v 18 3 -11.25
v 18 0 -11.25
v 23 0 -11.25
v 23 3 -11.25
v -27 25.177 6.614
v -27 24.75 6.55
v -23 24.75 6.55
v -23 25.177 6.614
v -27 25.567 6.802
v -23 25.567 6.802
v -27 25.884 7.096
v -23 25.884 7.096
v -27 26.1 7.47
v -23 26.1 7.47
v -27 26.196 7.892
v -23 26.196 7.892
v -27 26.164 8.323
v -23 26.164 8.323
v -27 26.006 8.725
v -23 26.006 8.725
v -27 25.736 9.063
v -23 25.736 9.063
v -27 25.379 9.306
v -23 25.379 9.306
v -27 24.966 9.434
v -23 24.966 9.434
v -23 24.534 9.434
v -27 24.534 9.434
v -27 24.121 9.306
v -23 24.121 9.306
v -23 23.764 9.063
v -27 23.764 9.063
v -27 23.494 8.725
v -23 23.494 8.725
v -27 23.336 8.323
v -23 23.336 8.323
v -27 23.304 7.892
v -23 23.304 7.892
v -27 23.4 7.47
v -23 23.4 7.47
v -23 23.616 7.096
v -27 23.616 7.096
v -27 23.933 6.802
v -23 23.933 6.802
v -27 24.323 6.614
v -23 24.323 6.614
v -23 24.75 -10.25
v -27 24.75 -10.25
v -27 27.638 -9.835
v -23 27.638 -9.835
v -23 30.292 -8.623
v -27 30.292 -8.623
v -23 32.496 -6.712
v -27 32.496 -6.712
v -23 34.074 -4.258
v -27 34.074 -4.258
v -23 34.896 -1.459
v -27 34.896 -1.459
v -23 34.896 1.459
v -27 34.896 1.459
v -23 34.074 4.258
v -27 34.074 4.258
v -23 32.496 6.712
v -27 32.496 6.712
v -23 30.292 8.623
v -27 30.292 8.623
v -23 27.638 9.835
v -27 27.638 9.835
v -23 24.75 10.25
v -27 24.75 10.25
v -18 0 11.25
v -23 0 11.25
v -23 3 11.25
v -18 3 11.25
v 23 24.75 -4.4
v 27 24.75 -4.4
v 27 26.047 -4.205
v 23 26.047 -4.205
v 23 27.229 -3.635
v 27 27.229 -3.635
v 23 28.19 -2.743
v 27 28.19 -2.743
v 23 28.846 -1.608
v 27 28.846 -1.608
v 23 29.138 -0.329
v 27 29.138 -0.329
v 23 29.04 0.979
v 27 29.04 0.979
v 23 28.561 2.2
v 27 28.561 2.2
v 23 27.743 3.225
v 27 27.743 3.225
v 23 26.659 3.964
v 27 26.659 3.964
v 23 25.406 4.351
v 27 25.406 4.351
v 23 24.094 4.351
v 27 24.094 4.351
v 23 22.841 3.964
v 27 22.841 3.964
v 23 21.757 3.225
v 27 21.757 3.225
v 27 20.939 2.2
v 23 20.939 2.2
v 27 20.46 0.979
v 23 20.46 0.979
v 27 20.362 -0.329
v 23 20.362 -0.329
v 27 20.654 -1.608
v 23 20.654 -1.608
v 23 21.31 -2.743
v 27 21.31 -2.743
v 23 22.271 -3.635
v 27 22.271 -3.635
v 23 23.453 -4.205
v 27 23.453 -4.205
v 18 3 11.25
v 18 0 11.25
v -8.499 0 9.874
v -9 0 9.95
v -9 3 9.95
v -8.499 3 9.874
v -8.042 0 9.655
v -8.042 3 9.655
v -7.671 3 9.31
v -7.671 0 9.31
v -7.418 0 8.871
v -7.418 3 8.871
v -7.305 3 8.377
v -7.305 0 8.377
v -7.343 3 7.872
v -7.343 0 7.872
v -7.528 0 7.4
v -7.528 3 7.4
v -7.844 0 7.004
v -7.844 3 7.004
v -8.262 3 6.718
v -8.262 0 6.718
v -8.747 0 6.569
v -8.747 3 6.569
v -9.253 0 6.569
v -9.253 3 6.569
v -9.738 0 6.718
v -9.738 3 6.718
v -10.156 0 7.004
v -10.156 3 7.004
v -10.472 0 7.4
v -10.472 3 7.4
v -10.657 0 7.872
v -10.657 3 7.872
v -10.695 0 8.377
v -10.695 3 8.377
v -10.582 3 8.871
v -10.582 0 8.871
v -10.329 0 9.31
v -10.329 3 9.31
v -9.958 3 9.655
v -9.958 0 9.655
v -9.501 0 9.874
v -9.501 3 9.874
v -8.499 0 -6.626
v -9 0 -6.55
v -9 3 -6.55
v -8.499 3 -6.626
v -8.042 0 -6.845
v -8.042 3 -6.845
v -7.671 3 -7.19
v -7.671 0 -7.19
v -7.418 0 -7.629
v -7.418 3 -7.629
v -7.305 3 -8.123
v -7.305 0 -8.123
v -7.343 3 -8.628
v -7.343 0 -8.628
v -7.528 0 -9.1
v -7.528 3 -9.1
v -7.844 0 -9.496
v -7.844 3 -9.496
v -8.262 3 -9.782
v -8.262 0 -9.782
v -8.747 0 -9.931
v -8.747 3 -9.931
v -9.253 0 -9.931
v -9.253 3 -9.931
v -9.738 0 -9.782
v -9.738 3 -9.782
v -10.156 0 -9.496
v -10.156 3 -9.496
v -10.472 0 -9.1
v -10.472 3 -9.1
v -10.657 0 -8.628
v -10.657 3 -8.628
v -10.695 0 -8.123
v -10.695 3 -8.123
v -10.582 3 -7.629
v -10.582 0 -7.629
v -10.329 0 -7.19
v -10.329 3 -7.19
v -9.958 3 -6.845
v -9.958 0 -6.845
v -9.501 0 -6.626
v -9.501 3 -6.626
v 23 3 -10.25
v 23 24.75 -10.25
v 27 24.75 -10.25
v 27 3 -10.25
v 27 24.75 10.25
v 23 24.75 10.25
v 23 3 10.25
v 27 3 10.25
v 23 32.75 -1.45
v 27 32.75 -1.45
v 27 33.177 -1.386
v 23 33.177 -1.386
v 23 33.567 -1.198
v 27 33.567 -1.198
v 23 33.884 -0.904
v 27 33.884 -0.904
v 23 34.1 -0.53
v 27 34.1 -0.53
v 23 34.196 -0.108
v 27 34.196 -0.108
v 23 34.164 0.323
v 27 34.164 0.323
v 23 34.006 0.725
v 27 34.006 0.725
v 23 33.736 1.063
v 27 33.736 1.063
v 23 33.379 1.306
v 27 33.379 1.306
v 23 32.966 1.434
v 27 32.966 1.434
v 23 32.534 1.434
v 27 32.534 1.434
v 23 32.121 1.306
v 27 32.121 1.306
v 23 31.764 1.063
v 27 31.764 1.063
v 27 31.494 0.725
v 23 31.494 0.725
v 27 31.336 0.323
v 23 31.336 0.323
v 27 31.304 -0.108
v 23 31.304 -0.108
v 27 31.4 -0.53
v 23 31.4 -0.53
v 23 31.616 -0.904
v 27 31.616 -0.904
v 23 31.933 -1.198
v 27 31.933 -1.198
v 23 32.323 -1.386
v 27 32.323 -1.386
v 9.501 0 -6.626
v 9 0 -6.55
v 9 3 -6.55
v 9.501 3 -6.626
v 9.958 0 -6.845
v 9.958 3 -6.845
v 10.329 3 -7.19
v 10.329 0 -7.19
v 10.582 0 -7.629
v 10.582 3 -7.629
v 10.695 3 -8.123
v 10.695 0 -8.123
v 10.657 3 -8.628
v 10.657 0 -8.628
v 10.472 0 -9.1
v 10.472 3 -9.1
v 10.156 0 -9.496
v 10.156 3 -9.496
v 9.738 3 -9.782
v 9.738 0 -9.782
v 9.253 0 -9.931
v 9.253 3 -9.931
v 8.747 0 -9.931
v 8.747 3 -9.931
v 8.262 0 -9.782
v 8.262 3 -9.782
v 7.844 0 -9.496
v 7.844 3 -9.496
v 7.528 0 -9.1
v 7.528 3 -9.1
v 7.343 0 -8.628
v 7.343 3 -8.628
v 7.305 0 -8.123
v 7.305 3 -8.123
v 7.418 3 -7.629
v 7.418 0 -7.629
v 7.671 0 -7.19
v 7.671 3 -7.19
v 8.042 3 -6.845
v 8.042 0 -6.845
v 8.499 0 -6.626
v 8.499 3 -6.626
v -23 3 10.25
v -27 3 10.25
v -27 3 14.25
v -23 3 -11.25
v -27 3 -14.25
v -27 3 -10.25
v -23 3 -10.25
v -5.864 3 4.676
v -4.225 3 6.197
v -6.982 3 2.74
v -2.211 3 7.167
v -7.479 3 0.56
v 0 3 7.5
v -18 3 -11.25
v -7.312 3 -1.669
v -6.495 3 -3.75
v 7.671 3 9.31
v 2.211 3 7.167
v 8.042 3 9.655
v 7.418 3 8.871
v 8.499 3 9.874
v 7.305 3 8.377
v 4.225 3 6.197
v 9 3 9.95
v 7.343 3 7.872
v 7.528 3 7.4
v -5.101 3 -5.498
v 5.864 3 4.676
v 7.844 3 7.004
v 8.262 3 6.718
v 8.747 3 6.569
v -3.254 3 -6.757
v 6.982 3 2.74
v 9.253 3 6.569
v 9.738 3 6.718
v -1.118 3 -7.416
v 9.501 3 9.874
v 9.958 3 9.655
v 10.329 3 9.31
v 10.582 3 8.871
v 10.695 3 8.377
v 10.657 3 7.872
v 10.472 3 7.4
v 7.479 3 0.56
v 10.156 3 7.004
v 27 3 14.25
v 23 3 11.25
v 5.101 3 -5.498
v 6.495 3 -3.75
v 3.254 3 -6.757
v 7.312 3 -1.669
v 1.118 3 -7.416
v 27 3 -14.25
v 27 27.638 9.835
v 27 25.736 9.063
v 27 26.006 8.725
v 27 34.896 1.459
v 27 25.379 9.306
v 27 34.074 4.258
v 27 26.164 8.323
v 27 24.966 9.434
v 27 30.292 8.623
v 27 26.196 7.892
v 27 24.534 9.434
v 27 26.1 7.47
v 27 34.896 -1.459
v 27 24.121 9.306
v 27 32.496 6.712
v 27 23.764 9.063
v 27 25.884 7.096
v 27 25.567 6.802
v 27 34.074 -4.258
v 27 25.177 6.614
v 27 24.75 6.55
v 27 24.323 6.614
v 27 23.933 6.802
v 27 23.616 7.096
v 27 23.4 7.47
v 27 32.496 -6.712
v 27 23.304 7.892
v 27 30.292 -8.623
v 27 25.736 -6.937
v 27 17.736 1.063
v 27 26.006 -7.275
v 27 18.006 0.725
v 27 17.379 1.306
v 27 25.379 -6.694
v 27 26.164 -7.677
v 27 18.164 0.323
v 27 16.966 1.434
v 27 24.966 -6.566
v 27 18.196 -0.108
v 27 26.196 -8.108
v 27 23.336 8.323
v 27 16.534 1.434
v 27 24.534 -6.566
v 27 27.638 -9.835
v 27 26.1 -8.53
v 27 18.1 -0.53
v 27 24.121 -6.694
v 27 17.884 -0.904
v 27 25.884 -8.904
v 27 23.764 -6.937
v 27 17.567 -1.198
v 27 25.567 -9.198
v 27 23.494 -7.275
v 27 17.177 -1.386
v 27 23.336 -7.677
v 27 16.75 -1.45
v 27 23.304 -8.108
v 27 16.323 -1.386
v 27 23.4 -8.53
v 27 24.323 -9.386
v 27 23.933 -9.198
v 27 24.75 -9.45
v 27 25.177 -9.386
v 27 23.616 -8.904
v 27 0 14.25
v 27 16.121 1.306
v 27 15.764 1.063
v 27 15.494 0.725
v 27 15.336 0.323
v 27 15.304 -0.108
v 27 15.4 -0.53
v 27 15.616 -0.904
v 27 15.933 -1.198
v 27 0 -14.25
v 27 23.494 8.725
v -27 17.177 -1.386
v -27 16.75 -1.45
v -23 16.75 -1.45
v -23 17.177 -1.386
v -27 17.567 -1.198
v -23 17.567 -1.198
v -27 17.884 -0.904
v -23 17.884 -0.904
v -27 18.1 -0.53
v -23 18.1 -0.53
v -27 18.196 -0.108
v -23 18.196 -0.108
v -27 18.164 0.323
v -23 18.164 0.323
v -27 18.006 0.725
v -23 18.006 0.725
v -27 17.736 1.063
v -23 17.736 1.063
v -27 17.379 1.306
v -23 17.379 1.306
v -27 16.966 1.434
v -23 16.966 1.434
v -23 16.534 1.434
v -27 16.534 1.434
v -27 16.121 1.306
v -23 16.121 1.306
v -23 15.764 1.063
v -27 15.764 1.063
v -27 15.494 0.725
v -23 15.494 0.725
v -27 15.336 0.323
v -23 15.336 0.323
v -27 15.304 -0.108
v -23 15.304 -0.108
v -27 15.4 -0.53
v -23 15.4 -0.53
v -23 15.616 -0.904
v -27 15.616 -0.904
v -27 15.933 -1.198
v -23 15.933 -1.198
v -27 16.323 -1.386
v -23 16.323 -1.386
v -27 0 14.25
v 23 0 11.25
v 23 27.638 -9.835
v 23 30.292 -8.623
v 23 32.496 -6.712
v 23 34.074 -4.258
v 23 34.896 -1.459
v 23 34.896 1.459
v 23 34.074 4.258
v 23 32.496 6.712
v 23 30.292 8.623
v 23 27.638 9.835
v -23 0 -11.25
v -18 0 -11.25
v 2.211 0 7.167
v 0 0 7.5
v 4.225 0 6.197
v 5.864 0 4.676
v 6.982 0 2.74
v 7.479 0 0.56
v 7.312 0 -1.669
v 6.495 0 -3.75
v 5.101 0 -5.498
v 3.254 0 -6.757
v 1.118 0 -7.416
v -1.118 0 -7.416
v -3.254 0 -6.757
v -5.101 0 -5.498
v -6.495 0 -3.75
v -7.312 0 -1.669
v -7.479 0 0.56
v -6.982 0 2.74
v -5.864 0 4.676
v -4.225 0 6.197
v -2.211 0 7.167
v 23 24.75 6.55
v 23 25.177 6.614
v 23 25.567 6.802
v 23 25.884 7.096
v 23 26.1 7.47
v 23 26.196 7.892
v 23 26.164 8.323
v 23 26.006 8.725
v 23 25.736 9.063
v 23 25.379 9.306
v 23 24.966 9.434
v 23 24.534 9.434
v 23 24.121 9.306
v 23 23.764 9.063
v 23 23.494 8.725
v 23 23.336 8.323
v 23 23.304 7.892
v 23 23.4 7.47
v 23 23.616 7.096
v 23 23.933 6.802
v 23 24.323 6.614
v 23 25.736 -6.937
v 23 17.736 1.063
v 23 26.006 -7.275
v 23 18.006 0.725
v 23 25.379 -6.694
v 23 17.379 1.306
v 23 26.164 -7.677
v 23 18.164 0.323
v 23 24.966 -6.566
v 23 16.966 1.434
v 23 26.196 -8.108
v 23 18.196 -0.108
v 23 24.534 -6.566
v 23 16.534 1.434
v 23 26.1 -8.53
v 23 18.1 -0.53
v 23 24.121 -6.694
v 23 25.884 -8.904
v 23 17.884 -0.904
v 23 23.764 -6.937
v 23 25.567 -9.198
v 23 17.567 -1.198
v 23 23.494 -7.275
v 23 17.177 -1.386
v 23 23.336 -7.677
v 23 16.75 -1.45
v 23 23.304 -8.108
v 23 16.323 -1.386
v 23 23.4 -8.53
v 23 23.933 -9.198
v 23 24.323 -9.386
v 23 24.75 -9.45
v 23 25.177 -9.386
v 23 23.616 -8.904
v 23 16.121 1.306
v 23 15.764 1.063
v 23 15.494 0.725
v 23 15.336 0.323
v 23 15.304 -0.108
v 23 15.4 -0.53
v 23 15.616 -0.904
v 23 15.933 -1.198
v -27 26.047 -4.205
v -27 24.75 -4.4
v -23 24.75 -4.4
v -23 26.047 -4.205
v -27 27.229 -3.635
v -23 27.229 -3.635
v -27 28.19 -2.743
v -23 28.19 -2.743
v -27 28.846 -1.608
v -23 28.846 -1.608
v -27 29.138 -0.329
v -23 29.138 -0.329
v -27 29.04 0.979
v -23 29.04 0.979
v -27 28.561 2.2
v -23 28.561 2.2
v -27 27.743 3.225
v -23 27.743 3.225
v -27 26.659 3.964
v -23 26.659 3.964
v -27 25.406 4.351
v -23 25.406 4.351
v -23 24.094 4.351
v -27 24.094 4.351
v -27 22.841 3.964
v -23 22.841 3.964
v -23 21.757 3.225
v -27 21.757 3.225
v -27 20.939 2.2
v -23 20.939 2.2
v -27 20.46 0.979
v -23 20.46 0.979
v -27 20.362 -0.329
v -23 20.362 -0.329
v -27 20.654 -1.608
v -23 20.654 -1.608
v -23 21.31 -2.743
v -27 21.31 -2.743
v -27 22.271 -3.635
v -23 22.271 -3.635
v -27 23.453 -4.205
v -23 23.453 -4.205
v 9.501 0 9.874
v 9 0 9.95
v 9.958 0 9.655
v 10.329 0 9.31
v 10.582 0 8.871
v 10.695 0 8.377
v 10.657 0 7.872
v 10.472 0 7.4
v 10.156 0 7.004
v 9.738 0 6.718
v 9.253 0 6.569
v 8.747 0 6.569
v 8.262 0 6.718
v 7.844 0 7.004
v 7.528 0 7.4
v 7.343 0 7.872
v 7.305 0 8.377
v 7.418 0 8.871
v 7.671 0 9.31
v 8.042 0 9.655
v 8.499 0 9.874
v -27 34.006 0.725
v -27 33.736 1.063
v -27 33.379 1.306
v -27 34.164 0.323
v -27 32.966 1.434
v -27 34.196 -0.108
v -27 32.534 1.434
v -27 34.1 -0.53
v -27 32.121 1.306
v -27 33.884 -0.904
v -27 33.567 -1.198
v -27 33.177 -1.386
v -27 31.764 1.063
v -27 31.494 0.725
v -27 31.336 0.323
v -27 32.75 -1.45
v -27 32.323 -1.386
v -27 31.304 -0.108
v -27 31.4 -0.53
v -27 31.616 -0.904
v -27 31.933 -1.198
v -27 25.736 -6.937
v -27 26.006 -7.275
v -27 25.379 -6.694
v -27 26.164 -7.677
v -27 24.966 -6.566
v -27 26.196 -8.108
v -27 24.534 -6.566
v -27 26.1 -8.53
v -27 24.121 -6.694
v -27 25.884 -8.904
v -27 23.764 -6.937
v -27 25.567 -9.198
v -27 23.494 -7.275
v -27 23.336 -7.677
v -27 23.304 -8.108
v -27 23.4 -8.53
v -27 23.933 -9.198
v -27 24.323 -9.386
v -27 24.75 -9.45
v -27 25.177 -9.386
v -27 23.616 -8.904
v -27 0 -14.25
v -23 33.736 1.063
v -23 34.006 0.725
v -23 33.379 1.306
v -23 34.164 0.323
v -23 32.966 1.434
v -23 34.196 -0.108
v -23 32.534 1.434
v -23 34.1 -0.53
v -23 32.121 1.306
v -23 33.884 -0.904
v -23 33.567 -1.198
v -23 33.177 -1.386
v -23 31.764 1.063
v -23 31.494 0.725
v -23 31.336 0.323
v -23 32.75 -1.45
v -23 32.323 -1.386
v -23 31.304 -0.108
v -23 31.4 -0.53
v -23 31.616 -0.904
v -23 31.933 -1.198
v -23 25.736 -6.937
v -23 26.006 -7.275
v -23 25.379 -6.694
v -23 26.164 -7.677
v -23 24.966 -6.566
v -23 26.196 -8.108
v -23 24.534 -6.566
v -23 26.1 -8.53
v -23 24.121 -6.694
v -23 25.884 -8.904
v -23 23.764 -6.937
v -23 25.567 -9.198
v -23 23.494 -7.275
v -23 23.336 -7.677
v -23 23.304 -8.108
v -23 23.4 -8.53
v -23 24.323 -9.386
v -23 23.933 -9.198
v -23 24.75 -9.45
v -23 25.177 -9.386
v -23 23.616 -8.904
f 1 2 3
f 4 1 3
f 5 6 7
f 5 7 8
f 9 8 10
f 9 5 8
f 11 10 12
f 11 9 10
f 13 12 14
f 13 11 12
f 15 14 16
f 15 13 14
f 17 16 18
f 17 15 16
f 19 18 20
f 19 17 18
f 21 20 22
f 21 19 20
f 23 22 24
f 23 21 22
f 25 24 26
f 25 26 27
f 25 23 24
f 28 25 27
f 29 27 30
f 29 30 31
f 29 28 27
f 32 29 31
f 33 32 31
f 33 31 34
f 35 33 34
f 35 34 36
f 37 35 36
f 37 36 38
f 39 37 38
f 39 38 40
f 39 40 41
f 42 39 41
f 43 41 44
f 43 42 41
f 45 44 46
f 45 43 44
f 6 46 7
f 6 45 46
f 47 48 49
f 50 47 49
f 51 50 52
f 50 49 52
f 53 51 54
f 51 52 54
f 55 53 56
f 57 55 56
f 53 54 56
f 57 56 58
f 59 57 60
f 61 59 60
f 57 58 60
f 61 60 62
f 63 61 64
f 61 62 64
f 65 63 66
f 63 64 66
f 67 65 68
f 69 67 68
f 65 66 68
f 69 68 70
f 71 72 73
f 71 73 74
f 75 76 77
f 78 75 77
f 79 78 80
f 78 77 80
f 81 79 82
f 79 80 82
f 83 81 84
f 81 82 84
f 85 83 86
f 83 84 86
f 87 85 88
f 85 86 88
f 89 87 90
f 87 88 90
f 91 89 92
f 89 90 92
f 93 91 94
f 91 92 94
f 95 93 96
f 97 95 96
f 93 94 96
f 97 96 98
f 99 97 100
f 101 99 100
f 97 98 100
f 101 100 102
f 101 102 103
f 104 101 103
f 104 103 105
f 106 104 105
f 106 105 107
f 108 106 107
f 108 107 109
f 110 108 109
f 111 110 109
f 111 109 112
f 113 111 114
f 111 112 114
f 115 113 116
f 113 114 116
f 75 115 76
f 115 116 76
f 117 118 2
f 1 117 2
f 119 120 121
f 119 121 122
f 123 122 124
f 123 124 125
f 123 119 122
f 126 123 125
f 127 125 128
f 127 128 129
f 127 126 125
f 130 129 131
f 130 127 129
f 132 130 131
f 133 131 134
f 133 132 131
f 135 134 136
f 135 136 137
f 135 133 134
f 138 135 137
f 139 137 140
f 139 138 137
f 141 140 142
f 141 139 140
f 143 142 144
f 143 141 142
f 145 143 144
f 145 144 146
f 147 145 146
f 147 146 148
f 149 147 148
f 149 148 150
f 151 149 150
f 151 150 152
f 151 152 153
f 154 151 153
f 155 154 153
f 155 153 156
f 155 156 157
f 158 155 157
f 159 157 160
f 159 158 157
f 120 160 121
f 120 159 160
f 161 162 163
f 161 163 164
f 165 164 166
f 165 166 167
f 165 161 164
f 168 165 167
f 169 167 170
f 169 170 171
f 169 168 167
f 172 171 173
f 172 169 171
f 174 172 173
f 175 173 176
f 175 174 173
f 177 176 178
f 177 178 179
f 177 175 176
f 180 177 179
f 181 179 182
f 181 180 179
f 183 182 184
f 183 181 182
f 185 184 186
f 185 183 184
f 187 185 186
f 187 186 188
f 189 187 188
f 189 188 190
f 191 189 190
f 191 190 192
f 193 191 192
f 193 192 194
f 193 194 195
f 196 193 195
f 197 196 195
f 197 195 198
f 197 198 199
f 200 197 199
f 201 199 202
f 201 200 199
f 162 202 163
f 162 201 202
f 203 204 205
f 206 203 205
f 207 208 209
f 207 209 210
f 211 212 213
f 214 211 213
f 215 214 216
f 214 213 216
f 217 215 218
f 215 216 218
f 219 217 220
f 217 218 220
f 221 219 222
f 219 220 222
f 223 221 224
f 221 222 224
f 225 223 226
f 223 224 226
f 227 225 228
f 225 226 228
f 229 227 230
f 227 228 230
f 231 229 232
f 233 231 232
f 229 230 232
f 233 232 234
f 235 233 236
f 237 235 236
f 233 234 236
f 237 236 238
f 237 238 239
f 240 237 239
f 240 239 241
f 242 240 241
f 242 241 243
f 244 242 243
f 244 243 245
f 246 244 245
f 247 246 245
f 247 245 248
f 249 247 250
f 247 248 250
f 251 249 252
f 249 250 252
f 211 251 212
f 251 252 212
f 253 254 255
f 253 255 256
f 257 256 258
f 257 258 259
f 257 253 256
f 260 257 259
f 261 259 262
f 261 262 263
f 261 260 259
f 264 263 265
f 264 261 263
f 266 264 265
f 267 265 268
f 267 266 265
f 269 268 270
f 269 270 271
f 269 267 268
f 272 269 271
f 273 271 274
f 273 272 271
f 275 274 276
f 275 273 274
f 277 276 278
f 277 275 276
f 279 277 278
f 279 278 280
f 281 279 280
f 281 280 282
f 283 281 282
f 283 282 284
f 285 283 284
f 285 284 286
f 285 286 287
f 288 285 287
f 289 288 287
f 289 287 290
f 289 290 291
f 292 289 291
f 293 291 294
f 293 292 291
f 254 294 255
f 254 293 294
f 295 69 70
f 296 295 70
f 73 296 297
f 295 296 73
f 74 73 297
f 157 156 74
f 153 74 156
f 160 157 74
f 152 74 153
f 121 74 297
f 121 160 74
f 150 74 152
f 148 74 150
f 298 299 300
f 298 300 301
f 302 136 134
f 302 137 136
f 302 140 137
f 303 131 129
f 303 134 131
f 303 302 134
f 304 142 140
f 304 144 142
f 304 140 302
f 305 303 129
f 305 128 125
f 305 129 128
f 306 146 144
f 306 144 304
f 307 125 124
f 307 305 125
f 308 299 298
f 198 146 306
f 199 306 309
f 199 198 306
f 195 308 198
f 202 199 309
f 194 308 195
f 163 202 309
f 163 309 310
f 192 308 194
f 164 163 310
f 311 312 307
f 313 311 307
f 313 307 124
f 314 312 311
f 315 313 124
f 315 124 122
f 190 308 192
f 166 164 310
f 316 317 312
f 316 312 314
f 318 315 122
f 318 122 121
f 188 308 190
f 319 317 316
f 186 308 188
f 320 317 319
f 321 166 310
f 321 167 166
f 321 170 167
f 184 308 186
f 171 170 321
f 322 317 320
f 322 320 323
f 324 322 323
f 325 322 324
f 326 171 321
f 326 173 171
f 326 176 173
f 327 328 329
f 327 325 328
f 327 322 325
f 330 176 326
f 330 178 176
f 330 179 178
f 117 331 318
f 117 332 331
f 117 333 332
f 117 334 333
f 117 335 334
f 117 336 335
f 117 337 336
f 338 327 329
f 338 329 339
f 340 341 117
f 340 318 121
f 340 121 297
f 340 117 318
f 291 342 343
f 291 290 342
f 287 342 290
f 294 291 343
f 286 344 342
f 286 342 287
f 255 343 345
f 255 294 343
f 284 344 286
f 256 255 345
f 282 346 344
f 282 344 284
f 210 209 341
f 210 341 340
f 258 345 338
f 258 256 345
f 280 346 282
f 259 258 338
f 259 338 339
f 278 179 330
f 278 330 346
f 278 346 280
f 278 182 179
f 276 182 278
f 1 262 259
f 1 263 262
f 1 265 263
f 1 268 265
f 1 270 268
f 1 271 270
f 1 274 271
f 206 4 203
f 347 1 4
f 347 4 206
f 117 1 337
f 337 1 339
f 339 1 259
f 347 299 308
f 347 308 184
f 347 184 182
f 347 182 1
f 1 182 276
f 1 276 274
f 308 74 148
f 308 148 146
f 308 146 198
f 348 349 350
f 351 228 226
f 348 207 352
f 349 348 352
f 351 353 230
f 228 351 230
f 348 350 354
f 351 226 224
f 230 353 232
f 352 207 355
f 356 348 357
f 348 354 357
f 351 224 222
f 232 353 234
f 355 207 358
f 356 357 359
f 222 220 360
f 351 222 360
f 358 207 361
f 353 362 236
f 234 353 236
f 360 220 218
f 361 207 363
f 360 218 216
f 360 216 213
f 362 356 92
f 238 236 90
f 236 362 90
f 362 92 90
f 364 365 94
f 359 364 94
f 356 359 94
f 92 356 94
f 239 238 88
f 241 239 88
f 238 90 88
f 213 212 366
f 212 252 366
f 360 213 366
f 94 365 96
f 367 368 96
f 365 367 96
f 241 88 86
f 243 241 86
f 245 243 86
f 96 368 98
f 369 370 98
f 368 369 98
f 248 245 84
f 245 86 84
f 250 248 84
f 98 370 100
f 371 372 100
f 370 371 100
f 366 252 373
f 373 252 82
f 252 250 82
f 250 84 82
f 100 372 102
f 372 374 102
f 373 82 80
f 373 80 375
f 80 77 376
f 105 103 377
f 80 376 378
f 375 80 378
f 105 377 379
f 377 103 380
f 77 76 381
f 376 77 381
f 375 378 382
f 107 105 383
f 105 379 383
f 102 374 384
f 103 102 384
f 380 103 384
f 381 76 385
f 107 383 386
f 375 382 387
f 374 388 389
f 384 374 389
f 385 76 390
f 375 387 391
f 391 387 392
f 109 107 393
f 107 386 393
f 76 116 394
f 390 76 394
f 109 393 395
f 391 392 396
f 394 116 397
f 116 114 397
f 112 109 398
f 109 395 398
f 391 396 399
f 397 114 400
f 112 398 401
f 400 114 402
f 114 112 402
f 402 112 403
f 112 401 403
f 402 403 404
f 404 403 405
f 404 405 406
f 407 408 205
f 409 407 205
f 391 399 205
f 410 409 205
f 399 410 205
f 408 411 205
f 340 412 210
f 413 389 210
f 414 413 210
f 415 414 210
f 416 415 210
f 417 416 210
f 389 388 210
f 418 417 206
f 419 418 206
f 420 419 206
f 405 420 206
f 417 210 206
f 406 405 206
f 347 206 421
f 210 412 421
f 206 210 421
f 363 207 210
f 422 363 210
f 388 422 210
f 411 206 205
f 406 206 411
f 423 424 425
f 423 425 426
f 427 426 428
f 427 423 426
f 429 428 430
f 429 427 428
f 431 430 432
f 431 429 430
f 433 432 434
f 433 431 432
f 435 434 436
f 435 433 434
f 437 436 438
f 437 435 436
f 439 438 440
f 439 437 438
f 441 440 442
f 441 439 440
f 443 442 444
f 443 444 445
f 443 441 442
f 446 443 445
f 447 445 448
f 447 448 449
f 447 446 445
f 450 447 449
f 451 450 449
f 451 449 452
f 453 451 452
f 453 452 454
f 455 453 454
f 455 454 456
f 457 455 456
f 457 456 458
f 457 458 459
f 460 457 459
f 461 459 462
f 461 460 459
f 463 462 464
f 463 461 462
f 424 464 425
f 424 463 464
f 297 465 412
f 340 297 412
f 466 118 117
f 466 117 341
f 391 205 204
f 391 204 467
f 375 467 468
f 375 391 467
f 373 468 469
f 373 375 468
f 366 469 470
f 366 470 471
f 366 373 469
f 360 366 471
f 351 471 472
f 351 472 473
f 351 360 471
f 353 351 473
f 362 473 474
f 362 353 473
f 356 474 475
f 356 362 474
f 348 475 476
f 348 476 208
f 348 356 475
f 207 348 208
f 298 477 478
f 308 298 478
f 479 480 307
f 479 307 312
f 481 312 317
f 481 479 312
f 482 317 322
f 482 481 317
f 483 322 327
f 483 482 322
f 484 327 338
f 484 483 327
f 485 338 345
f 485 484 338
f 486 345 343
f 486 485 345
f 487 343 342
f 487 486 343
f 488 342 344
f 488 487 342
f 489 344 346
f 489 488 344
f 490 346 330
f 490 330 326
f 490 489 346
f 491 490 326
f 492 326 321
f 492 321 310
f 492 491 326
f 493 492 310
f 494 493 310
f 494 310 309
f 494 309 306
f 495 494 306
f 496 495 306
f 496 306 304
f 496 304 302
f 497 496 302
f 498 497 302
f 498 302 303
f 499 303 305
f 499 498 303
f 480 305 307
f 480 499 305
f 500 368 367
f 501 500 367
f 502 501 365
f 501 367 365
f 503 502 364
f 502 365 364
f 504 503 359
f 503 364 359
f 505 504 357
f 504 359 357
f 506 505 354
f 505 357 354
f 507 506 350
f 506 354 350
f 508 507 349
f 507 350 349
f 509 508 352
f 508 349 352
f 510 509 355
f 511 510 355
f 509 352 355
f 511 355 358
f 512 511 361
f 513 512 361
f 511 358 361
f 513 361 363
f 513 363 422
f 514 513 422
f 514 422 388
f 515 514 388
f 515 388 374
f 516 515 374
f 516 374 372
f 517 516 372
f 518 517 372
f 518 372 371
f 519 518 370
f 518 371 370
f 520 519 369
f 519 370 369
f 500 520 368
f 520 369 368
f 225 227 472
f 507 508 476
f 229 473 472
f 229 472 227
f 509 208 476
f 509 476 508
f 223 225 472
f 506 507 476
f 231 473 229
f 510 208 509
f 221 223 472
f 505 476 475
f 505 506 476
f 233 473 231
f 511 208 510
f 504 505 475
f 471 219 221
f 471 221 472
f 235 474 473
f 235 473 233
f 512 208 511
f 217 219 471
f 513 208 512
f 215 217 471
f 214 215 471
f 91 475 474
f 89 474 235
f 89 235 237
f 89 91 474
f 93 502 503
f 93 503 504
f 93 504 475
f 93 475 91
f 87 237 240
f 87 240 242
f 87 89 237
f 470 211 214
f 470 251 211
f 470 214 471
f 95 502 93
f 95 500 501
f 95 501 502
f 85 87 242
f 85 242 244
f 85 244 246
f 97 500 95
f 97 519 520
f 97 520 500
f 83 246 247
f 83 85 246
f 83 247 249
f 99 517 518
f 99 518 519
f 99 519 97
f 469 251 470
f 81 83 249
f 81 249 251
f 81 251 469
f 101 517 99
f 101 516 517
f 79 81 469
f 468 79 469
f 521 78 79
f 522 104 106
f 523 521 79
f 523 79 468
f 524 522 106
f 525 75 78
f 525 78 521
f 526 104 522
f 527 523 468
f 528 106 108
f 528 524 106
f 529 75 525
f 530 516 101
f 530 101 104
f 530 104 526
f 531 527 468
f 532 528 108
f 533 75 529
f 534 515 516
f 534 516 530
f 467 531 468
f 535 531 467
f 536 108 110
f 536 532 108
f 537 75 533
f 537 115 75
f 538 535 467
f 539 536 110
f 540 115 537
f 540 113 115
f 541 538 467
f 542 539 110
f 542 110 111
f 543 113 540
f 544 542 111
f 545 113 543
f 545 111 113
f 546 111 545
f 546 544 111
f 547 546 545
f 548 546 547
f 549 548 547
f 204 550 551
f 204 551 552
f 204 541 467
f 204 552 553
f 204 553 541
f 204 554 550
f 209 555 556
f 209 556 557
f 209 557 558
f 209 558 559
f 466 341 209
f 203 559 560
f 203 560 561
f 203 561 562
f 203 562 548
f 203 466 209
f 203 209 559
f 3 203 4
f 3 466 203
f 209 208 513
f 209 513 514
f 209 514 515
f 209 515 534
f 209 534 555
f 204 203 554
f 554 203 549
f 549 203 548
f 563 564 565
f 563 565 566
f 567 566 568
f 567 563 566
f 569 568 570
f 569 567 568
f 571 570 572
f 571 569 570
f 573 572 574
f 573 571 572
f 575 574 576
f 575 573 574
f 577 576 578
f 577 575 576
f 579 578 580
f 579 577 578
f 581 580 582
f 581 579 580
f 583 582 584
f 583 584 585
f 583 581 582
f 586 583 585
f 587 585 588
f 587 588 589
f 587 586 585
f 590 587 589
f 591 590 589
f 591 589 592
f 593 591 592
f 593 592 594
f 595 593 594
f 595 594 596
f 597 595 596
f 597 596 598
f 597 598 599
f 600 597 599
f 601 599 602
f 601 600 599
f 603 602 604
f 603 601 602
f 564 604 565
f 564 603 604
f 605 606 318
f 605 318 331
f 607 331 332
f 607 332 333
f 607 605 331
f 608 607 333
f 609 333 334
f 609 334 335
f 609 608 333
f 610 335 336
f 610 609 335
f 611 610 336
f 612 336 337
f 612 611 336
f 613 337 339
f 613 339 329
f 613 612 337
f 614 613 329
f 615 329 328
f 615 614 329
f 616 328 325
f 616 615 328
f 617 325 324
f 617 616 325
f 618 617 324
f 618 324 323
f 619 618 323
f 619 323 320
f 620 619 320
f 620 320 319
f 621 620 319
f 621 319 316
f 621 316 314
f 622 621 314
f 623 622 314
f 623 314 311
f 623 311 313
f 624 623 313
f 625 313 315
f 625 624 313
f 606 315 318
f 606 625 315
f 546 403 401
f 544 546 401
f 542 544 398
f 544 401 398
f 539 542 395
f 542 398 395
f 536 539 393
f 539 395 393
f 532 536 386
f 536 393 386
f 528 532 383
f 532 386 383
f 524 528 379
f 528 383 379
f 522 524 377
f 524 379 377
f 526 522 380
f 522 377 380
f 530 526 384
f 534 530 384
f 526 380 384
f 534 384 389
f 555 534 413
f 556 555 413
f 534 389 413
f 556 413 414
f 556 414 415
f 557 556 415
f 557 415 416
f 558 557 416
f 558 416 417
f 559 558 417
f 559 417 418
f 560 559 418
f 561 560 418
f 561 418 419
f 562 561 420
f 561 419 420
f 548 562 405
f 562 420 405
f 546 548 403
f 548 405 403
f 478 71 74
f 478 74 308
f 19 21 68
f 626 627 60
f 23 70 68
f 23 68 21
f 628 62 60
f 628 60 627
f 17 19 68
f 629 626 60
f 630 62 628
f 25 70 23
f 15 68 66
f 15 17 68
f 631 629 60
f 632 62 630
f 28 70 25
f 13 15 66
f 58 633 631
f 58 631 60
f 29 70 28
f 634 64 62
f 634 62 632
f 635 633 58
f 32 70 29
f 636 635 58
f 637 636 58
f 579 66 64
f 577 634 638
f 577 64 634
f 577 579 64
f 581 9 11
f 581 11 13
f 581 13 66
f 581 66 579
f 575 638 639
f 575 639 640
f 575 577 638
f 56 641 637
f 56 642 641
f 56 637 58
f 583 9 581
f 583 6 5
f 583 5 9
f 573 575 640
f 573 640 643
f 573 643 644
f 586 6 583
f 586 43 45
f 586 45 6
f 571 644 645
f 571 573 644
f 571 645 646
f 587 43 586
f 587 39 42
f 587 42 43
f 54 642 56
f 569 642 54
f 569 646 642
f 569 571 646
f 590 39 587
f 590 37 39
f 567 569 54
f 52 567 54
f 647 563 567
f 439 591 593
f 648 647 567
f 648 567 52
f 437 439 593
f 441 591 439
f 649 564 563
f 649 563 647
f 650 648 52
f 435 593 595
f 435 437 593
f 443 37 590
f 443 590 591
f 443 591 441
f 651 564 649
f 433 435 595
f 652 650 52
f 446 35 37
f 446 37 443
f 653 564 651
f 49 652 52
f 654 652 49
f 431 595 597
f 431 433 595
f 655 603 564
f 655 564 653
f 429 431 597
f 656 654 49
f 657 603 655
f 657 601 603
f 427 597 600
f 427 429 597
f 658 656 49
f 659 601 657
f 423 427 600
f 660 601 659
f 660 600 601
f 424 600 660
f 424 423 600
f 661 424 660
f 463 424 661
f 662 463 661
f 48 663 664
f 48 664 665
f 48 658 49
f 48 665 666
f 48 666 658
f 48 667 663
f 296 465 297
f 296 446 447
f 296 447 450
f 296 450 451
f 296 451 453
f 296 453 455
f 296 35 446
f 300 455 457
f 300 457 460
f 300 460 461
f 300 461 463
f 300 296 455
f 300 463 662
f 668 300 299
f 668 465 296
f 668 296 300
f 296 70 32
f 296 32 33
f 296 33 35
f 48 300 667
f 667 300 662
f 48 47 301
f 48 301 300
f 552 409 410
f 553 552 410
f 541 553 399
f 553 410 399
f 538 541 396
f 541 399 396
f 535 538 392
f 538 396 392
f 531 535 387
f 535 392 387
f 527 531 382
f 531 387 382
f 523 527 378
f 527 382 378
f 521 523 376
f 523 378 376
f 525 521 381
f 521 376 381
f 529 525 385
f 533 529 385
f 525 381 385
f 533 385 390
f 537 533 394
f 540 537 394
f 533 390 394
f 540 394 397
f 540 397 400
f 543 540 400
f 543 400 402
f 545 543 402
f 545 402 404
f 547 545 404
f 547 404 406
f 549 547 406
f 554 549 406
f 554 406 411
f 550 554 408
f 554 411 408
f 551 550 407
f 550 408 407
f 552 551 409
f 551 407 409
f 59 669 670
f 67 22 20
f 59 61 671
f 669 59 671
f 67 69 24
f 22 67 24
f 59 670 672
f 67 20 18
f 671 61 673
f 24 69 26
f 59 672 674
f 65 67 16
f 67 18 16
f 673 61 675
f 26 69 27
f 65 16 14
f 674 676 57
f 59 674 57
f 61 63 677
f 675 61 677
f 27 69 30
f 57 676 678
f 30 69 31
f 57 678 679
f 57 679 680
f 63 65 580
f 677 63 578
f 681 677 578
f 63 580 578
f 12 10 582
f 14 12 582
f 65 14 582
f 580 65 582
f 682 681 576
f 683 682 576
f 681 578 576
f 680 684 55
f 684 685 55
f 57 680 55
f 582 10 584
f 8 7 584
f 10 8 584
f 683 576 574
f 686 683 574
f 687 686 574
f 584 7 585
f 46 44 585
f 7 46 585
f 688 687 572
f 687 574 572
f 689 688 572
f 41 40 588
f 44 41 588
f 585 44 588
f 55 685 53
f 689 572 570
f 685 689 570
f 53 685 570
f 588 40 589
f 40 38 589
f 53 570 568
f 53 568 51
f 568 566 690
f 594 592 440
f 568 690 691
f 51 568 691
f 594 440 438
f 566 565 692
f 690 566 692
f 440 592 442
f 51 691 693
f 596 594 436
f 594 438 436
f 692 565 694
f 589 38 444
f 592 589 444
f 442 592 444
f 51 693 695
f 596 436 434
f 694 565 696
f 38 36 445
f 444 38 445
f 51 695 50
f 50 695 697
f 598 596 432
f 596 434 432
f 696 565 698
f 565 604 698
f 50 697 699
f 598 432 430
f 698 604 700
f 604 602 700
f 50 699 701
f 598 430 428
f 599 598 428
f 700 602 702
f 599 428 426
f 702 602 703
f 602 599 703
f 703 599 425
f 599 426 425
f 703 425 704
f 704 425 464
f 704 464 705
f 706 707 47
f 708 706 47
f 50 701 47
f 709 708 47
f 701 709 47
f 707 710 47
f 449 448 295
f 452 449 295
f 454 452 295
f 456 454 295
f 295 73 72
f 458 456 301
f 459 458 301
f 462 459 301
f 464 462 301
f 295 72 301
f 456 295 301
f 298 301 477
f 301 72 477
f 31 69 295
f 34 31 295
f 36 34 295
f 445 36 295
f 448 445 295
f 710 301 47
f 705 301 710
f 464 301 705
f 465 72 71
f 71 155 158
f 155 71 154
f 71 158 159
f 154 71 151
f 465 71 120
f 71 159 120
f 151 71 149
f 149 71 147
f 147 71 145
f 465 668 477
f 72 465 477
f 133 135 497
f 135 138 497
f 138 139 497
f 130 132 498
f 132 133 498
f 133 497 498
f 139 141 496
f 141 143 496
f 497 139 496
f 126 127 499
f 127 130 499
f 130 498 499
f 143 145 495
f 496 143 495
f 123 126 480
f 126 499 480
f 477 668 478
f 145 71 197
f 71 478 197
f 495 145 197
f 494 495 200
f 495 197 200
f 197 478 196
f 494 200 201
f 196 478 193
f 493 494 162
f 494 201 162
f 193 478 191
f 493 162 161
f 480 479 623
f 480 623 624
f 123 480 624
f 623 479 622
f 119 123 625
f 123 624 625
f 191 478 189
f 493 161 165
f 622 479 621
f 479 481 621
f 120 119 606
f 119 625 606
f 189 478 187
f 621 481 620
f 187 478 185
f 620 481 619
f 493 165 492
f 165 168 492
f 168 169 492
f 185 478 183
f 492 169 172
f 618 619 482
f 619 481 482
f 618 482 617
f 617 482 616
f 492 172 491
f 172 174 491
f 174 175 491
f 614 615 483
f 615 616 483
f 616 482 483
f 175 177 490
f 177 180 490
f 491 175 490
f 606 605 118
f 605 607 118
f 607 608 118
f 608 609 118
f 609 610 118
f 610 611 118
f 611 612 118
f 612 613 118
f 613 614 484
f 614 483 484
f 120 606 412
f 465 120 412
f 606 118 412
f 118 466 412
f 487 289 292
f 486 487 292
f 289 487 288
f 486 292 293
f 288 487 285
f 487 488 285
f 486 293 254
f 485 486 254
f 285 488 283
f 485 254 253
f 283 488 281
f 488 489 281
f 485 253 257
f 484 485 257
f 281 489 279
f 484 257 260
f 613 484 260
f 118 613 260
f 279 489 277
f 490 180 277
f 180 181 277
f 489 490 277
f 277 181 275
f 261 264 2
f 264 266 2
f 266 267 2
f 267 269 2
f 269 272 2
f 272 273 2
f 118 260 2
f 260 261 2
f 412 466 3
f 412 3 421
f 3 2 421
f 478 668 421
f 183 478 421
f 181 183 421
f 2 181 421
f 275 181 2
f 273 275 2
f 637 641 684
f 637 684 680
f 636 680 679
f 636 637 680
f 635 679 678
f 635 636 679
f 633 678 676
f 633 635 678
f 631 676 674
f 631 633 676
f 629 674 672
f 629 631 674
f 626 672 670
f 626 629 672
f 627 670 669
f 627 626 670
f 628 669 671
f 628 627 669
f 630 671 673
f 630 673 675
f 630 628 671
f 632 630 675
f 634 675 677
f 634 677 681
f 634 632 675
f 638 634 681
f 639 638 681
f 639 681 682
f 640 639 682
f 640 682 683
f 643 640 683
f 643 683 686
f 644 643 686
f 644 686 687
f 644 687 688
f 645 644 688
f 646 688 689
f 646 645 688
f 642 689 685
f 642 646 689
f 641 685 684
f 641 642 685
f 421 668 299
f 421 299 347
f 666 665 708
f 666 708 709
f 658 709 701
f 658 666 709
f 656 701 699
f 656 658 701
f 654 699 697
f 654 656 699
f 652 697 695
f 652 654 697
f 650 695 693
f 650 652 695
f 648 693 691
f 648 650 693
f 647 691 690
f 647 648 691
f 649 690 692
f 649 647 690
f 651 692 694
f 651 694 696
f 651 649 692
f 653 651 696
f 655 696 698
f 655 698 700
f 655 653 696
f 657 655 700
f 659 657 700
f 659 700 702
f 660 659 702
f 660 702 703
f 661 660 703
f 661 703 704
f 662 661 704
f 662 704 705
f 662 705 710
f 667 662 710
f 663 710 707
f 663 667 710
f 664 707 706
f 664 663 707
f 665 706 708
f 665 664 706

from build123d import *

# Parameters (mm, degrees)
SKETCH1_W           = 54
SKETCH1_H           = 28.5
SKETCH1_W_2         = 5
SKETCH1_H_2         = 22.5
SKETCH1_R           = 1.7
SKETCH1_R_2         = 7.5
BOSS_EXTRUDE2_DEPTH = 3
SKETCH2_W           = 4
SKETCH2_H           = 20.5
BOSS_EXTRUDE3_DEPTH = 21.75
SKETCH4_R           = 10.25
BOSS_EXTRUDE4_DEPTH = 4
SKETCH6_R           = 4.4
SKETCH6_R_2         = 1.45
CUT_EXTRUDE3_DEPTH  = 4


with BuildPart() as part:
    # Sketch1 → Boss-Extrude2 (new body)
    with BuildSketch(Plane(origin=(0, 0, 0), x_dir=(1, 0, 0), z_dir=(0, 1, 0))):
        Rectangle(SKETCH1_W, SKETCH1_H)
        with Locations((20.5, 0)):
            Rectangle(SKETCH1_W_2, SKETCH1_H_2, mode=Mode.SUBTRACT)
        with Locations((-20.5, 0)):
            Rectangle(SKETCH1_W_2, SKETCH1_H_2, mode=Mode.SUBTRACT)
        with Locations(Location((-9, -8.25, 0), (0, 0, 270))):
            Circle(SKETCH1_R, mode=Mode.SUBTRACT)
        with Locations(Location((9, -8.25, 0), (0, 0, 270))):
            Circle(SKETCH1_R, mode=Mode.SUBTRACT)
        with Locations(Location((-9, 8.25, 0), (0, 0, 270))):
            Circle(SKETCH1_R, mode=Mode.SUBTRACT)
        with Locations(Location((0, 0, 0), (0, 0, 270))):
            Circle(SKETCH1_R_2, mode=Mode.SUBTRACT)
        with Locations(Location((9, 8.25, 0), (0, 0, 270))):
            Circle(SKETCH1_R, mode=Mode.SUBTRACT)
    extrude(amount=BOSS_EXTRUDE2_DEPTH)

    # Sketch2 → Boss-Extrude3 (add)
    with BuildSketch(Plane(origin=(0, 3, 0), x_dir=(1, 0, 0), z_dir=(0, 1, 0))):
        with Locations((25, 0)):
            Rectangle(SKETCH2_W, SKETCH2_H)
    boss_extrude3 = extrude(amount=BOSS_EXTRUDE3_DEPTH)

    # Sketch4 → Boss-Extrude4 (add)
    with BuildSketch(Plane(origin=(27, 0, 0), x_dir=(0, 0, -1), z_dir=(1, 0, 0))):
        with Locations((0, 24.75)):
            Circle(SKETCH4_R)
    boss_extrude4 = extrude(amount=-BOSS_EXTRUDE4_DEPTH)

    # Mirror1: Boss-Extrude3, Boss-Extrude4 across plane
    add(boss_extrude3.mirror(Plane(origin=(0, 0, 0), x_dir=(0, 0, 1), z_dir=(1, 0, 0))))
    add(boss_extrude4.mirror(Plane(origin=(0, 0, 0), x_dir=(0, 0, 1), z_dir=(1, 0, 0))))

    # Sketch6 → Cut-Extrude3 (cut)
    with BuildSketch(Plane(origin=(27, 0, 0), x_dir=(0, 0, -1), z_dir=(1, 0, 0))):
        with Locations((0, 24.75)):
            Circle(SKETCH6_R)
        with Locations((0, 32.75)):
            Circle(SKETCH6_R_2)
        with Locations((8, 24.75)):
            Circle(SKETCH6_R_2)
        with Locations((0, 16.75)):
            Circle(SKETCH6_R_2)
        with Locations((-8, 24.75)):
            Circle(SKETCH6_R_2)
    cut_extrude3 = extrude(amount=-CUT_EXTRUDE3_DEPTH, mode=Mode.SUBTRACT)

    # Mirror3: Cut-Extrude3 across plane
    add(cut_extrude3.mirror(Plane(origin=(0, 0, 0), x_dir=(0, 0, 1), z_dir=(1, 0, 0))), mode=Mode.SUBTRACT)


solid = part.part
